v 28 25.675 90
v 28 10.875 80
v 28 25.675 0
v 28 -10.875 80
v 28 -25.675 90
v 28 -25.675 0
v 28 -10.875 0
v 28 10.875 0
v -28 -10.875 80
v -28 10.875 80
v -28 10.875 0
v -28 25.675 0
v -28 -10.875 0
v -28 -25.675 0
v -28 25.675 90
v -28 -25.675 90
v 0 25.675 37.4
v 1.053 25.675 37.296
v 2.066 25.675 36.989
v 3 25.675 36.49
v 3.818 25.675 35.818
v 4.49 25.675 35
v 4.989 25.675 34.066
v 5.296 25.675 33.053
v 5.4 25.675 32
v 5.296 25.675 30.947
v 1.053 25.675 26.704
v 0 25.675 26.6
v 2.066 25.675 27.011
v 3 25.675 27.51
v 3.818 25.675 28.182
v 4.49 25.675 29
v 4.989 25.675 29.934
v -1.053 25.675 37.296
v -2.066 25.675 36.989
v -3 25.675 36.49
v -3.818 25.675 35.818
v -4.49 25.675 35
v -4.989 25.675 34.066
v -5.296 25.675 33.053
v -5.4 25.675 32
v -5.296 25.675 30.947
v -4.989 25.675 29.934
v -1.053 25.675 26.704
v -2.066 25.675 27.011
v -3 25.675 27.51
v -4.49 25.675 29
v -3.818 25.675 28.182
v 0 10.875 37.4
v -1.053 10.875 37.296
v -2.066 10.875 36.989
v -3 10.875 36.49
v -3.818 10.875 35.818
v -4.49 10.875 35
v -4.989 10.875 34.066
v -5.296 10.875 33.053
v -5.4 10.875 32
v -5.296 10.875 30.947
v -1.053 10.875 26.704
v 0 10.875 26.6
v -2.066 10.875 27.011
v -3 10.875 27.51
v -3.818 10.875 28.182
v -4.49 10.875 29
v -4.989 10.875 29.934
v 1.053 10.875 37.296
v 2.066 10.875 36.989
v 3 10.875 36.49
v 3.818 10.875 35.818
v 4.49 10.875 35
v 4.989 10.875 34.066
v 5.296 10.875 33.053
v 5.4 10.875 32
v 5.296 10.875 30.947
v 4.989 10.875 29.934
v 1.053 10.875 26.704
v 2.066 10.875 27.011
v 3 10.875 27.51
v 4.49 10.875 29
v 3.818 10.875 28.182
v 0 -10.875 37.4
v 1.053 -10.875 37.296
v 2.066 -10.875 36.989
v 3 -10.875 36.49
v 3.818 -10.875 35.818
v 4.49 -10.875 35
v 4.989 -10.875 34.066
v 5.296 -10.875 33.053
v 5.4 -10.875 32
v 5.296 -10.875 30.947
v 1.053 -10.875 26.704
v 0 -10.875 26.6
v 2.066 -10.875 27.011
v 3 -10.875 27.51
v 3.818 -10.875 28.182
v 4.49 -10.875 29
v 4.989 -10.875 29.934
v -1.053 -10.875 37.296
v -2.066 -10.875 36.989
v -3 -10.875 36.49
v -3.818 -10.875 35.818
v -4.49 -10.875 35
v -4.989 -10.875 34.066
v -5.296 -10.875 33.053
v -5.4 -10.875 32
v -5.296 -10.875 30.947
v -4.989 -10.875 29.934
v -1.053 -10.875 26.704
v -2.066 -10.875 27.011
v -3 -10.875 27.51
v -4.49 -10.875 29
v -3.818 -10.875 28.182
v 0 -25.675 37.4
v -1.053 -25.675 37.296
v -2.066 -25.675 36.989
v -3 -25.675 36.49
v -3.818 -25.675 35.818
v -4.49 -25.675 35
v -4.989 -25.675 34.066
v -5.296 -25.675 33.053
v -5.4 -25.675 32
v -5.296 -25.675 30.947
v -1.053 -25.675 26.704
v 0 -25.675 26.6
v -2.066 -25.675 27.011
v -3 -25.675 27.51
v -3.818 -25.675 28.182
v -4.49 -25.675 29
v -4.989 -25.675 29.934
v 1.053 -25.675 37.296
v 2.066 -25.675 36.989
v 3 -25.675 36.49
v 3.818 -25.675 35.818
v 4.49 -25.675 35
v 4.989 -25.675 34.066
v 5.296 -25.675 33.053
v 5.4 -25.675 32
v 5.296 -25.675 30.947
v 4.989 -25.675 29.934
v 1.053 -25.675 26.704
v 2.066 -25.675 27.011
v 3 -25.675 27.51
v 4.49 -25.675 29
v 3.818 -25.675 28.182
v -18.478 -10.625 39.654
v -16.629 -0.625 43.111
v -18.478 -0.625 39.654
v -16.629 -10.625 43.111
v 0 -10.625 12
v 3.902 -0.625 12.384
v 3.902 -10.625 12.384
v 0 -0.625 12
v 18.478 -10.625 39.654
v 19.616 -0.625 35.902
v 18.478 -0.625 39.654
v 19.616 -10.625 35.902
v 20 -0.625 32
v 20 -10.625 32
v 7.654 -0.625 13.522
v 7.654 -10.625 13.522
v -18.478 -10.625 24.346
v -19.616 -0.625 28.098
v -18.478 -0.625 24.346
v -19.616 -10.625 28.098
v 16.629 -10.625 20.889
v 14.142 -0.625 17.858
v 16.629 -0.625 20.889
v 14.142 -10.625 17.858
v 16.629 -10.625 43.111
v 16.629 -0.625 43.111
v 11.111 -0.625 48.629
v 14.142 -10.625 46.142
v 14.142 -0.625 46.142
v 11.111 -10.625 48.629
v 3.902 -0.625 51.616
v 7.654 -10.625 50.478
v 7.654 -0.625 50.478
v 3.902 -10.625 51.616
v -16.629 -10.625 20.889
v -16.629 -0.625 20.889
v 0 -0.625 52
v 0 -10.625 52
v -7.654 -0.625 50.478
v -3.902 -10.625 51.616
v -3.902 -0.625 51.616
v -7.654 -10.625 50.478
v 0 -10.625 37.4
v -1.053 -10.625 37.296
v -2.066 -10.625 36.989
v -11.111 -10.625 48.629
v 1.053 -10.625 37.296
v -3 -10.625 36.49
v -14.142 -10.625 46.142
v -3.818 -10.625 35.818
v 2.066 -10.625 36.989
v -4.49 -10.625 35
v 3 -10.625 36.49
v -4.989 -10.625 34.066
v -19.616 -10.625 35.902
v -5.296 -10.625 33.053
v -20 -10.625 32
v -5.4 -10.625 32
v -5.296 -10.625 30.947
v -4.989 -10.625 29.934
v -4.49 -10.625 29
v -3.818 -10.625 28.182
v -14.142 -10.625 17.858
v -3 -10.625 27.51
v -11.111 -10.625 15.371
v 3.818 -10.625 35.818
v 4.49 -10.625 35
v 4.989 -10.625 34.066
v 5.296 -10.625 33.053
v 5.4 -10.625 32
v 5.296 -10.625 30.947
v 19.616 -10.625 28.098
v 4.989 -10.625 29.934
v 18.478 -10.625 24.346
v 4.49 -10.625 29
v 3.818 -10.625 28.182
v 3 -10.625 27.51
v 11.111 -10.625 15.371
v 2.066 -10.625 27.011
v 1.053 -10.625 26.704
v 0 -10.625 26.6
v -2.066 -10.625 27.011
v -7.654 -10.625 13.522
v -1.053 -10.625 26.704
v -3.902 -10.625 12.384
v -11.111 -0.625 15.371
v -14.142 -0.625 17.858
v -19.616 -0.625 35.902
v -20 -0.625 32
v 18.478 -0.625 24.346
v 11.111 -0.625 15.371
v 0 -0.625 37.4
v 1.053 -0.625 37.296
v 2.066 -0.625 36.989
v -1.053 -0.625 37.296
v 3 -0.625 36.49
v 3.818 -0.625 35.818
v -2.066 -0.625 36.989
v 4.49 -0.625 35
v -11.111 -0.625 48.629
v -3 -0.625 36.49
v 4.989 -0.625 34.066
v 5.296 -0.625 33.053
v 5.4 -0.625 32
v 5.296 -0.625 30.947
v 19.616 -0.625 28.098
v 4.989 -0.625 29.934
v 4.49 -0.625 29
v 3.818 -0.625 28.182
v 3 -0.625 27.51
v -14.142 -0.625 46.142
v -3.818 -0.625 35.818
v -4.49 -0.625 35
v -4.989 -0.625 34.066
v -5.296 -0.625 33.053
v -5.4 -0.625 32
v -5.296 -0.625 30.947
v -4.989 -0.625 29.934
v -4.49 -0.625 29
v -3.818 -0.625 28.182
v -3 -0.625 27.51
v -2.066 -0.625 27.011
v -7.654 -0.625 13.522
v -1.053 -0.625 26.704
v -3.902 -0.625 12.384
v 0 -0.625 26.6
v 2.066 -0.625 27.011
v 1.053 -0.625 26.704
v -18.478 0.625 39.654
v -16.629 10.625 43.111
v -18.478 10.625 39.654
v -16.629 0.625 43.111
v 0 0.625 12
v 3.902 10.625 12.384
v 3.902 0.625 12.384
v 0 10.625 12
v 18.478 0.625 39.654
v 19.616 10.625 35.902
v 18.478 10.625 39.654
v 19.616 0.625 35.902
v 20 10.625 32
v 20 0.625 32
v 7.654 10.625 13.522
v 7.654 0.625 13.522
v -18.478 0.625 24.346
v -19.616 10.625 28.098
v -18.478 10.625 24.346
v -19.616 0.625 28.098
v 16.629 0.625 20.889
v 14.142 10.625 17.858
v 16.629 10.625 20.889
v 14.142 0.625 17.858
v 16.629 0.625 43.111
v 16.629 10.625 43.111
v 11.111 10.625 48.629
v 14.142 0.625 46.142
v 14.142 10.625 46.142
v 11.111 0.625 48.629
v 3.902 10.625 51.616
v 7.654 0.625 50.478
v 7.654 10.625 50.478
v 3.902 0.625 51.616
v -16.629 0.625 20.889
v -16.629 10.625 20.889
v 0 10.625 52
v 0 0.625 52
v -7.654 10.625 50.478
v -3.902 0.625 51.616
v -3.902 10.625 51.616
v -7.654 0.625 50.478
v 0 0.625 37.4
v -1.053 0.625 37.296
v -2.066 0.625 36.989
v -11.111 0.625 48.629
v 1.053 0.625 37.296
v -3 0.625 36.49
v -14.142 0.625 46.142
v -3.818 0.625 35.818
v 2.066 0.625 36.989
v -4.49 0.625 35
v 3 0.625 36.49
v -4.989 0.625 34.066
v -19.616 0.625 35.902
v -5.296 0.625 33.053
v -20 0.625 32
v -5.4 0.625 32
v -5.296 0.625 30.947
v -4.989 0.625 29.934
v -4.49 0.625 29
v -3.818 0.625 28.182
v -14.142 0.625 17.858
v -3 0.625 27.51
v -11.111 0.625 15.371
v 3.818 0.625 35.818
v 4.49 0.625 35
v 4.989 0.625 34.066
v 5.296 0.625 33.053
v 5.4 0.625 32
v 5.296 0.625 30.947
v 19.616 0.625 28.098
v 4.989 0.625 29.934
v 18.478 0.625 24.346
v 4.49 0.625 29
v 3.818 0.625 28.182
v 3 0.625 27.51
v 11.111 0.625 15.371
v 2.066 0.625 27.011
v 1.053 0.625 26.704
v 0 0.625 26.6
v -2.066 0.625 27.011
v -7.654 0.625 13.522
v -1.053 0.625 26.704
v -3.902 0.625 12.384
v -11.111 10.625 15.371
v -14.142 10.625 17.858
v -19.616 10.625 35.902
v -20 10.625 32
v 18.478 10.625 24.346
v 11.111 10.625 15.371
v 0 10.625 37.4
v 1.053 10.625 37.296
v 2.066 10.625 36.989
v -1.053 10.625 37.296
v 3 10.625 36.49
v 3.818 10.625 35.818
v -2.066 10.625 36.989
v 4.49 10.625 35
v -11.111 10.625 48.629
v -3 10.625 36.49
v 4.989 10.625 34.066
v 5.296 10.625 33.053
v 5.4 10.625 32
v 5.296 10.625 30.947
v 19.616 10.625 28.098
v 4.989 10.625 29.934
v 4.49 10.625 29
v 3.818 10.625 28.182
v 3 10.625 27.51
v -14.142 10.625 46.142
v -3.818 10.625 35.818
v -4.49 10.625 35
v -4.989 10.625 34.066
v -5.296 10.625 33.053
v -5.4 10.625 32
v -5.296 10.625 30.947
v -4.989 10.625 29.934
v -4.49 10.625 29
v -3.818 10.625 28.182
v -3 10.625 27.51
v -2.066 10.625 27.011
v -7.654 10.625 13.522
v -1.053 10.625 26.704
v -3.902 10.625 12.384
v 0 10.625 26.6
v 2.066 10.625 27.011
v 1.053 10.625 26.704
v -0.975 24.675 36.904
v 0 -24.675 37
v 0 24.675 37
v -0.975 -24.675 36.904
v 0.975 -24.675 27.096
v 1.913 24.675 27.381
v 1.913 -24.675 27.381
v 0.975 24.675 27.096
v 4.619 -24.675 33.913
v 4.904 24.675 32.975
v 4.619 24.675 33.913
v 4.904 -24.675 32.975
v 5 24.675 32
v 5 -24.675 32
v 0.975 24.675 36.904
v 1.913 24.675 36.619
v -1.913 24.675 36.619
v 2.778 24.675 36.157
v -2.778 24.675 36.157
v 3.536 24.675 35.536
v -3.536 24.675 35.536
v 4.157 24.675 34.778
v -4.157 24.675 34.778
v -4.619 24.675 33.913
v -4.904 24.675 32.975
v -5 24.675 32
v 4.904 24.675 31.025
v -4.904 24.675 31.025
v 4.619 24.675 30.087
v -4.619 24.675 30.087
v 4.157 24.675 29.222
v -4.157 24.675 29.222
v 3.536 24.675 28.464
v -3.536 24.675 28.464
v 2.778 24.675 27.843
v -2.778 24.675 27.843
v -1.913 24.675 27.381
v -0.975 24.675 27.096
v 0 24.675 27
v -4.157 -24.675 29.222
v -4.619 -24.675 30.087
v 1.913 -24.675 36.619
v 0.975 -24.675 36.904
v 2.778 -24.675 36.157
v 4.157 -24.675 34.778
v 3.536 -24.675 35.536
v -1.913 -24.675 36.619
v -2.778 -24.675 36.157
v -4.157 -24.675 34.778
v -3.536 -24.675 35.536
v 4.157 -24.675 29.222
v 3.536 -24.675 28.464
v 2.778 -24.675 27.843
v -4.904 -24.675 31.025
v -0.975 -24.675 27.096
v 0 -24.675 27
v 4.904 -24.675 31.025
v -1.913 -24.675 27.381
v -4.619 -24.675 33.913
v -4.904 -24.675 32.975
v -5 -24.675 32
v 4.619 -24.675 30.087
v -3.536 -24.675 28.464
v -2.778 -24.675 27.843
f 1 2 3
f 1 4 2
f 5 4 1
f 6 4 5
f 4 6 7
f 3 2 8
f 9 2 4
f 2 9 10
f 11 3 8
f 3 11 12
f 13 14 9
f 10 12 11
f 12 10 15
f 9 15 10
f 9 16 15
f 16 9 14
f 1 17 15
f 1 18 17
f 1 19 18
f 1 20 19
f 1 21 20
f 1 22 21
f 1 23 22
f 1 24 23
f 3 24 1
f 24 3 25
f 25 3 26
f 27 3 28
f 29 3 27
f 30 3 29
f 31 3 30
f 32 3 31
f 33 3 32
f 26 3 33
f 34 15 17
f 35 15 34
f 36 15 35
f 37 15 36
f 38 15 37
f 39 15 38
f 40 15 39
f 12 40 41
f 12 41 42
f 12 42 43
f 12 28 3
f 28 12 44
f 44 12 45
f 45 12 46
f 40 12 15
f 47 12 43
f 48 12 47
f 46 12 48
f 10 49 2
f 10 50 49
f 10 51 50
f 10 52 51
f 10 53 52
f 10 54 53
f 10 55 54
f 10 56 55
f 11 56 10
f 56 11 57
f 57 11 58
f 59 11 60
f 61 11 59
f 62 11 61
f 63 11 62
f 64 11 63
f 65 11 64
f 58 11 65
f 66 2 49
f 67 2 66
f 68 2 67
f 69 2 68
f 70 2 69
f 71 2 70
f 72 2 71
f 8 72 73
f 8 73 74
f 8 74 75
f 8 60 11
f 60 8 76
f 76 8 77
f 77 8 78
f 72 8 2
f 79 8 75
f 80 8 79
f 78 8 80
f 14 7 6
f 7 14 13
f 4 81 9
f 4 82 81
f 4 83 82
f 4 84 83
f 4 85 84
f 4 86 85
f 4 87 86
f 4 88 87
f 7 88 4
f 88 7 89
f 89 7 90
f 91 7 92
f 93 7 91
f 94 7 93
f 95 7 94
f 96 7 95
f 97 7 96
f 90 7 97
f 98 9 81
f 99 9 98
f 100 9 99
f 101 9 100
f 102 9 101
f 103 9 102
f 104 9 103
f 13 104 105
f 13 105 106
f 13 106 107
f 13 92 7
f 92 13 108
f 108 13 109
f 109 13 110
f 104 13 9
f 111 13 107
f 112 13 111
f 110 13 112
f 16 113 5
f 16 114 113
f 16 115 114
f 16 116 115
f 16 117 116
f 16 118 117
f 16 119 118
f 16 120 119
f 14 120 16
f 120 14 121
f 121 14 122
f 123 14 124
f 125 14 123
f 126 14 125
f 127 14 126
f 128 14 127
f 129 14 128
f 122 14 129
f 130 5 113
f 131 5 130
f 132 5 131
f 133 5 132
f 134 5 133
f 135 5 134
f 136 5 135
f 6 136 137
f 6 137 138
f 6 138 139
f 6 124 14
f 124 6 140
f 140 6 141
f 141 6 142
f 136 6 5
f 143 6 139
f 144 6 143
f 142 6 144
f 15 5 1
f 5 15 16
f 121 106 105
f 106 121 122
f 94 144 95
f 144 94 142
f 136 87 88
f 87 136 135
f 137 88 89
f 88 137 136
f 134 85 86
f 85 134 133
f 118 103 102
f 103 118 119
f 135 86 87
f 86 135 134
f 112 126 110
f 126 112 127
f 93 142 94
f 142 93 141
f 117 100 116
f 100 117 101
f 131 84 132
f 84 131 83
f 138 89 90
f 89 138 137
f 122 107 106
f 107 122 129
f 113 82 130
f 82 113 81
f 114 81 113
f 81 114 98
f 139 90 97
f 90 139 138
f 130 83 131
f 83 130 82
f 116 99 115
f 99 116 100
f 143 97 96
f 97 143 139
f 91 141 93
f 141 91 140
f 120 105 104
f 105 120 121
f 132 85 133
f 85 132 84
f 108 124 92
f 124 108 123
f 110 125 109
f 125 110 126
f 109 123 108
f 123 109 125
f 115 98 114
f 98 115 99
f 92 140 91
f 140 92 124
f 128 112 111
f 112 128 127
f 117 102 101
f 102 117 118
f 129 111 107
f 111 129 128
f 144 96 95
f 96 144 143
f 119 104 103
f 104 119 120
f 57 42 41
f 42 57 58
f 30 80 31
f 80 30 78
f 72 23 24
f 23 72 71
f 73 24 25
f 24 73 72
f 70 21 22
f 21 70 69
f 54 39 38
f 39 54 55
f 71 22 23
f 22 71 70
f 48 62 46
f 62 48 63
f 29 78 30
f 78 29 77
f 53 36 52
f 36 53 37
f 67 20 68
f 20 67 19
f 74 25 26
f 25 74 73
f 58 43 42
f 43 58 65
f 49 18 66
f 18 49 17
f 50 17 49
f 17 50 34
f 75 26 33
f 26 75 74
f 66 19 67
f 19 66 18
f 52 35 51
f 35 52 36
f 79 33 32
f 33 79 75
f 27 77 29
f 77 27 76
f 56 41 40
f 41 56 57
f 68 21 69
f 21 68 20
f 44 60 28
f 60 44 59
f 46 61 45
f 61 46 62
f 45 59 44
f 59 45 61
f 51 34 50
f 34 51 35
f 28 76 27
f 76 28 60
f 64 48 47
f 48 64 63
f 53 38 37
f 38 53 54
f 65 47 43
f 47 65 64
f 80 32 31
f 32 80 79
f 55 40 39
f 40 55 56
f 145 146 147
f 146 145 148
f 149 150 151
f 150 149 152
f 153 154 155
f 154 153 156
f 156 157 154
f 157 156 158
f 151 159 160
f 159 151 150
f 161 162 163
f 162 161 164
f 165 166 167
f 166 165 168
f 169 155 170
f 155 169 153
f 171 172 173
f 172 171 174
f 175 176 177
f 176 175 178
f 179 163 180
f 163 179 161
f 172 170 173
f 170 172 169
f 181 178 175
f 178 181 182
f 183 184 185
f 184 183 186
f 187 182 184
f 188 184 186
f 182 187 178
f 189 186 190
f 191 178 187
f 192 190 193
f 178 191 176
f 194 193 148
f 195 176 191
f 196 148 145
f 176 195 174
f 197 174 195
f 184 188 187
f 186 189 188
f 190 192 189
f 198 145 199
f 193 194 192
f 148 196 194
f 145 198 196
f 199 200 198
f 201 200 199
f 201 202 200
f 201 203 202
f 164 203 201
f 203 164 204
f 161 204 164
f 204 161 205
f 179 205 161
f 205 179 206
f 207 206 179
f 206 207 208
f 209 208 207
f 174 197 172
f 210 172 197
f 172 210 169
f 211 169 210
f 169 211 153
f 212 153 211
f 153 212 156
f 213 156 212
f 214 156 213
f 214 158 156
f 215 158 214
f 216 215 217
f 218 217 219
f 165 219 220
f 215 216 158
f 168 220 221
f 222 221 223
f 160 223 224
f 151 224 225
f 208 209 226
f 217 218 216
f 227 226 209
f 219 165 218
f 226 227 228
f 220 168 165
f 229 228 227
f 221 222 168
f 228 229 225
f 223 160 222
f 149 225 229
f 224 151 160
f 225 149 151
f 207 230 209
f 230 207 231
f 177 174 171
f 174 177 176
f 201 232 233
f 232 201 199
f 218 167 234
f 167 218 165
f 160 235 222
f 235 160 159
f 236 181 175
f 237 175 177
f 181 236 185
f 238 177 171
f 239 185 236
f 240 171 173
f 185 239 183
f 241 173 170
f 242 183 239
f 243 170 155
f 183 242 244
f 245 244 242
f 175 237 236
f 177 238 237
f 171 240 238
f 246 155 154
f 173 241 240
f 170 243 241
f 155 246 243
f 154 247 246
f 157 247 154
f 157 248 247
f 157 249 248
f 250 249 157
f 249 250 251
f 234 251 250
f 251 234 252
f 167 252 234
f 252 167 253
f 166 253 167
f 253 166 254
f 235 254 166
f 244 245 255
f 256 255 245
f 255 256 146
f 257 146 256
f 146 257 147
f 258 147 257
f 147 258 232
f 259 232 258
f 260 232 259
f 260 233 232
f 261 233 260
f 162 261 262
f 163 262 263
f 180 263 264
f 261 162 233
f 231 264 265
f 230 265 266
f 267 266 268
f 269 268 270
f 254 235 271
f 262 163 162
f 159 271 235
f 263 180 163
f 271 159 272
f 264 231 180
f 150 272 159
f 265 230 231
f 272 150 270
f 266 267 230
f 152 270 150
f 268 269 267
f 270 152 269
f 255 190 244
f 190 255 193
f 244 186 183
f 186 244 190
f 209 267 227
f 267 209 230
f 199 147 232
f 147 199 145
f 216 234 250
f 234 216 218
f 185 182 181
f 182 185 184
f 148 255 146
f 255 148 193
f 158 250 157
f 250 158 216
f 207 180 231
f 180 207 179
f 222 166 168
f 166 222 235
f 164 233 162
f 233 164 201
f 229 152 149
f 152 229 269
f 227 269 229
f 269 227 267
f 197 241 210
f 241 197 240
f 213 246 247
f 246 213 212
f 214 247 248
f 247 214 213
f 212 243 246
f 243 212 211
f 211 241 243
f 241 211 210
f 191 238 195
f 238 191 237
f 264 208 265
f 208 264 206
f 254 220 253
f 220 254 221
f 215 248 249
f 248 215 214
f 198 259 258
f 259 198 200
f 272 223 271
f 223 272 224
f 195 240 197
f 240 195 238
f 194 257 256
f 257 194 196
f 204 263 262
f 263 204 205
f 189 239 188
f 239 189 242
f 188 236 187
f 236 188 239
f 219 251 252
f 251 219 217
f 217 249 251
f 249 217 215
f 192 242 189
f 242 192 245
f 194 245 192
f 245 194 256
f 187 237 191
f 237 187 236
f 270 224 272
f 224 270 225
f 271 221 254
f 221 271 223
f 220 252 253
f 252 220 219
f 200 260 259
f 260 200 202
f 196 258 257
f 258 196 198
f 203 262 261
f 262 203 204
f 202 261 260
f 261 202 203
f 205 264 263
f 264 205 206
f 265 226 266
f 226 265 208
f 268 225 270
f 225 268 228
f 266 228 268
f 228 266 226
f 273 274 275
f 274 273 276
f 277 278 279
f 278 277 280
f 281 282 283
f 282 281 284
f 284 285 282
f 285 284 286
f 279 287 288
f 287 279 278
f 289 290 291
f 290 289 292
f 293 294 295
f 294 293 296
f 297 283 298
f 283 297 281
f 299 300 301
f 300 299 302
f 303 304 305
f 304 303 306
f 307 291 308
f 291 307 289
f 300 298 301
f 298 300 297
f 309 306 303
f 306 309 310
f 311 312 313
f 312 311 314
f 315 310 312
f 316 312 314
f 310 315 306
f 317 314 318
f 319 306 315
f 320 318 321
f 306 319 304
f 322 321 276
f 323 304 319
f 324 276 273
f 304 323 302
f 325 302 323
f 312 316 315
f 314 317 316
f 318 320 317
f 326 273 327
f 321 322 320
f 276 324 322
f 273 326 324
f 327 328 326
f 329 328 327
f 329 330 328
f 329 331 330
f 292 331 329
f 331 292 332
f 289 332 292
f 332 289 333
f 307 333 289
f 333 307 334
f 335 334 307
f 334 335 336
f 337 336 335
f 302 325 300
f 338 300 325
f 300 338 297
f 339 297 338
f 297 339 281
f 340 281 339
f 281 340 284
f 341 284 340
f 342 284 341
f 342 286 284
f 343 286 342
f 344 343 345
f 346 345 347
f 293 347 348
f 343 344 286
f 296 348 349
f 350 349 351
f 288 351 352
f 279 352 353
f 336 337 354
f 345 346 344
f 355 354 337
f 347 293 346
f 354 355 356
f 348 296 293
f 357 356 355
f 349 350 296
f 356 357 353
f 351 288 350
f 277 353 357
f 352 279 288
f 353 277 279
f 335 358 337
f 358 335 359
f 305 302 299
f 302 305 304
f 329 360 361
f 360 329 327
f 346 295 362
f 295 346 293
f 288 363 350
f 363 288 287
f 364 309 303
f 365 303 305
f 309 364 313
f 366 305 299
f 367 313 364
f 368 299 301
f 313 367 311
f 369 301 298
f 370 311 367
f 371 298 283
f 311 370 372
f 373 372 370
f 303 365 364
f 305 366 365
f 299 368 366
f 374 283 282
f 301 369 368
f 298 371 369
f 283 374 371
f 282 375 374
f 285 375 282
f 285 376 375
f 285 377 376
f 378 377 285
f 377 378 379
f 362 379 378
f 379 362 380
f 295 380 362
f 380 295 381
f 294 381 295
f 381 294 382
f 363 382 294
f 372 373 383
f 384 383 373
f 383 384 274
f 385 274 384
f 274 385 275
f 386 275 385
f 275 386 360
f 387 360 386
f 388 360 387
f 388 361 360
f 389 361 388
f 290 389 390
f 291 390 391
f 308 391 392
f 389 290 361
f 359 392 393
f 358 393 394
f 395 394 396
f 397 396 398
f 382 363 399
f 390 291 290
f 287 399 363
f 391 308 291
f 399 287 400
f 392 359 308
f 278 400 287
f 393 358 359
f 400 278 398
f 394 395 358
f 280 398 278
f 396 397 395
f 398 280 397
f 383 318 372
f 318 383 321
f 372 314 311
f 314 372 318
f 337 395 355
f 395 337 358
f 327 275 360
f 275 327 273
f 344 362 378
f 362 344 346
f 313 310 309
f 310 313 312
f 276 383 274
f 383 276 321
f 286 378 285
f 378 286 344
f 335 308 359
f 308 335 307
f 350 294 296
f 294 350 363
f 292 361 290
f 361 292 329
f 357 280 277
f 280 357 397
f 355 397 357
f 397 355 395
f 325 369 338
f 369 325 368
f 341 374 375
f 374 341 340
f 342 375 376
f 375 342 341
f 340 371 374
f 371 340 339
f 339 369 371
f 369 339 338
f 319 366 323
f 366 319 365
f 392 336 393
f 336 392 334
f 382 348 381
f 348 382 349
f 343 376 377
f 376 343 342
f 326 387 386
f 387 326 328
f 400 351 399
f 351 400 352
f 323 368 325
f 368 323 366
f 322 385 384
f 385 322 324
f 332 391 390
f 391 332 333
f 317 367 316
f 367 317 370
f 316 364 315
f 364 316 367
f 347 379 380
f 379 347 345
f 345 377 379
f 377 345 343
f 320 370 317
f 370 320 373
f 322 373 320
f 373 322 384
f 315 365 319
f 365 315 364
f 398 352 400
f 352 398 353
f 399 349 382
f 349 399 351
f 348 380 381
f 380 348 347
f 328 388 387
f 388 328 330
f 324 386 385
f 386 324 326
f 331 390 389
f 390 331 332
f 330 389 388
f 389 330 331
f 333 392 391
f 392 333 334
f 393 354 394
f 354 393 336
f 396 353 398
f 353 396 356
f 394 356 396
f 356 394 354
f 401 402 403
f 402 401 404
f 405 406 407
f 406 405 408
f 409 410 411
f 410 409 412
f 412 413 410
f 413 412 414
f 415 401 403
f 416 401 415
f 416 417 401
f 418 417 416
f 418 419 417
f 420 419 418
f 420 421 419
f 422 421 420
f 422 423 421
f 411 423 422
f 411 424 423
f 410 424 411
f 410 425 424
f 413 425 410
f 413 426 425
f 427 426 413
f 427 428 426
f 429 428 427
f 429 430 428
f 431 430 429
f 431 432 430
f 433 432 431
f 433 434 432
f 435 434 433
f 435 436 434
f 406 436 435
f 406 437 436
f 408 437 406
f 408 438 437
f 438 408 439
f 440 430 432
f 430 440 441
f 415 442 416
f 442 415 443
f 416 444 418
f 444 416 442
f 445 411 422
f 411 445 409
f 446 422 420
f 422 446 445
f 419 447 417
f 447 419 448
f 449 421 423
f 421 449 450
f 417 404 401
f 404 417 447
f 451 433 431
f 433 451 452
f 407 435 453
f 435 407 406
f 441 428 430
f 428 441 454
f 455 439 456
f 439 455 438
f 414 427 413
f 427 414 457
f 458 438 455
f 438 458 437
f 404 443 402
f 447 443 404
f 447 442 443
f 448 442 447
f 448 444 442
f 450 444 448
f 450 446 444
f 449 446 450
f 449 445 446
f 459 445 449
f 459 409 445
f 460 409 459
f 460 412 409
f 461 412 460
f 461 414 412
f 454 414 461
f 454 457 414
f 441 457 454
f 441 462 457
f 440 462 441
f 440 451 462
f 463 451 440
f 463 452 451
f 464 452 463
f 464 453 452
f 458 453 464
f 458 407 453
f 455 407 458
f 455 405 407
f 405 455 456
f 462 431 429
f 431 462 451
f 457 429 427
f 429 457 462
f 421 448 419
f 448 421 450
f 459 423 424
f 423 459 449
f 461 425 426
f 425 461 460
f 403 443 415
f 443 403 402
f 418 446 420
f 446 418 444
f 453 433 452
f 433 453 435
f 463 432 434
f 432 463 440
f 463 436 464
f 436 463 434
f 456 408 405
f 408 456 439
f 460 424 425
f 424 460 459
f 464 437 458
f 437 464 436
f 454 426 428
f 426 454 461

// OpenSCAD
$fn = 32;

// ------------------------------------------------------------------------
// Trolley wheel set: wheels d40, fork 80 mm tall
// Every part is its own module, assembly() places every instance.
// ------------------------------------------------------------------------

// --- part 1 ---
module trolley_fork() {
  difference() {
    union() {
      translate([-28, 10.875, 0]) cube([56, 14.8, 80]);
      translate([-28, -25.675, 0]) cube([56, 14.8, 80]);
      translate([-28, -25.675, 80]) cube([56, 51.35, 10]);
    }
    translate([0, -18.275, 32]) rotate([90, 0, 0]) cylinder(h = 16.8, d = 10.8, center = true);
    translate([0, 18.275, 32]) rotate([90, 0, 0]) cylinder(h = 16.8, d = 10.8, center = true);
  }
}

// --- part 2 ---
module trolley_wheel() {
  difference() {
      translate([0, 0, 0]) cylinder(h = 10, d = 40);
      translate([0, 0, -1]) cylinder(h = 12, d = 10.8);
    }
}

// --- part 3 ---
module trolley_axle() {
  translate([0, 0, -24.675]) cylinder(h = 49.35, d = 10);
}

// --- assembly ---
module assembly() {
  color([0.80, 0.24, 0.20]) translate([0, 0, 0]) rotate([0, 0, 0]) trolley_fork();
  color([0.20, 0.45, 0.75]) translate([0, -0.625, 32]) rotate([90, 0, 0]) trolley_wheel();
  color([0.25, 0.62, 0.32]) translate([0, 10.625, 32]) rotate([90, 0, 0]) trolley_wheel();
  color([0.92, 0.70, 0.18]) translate([0, 0, 32]) rotate([90, 0, 0]) trolley_axle();
}

assembly();
